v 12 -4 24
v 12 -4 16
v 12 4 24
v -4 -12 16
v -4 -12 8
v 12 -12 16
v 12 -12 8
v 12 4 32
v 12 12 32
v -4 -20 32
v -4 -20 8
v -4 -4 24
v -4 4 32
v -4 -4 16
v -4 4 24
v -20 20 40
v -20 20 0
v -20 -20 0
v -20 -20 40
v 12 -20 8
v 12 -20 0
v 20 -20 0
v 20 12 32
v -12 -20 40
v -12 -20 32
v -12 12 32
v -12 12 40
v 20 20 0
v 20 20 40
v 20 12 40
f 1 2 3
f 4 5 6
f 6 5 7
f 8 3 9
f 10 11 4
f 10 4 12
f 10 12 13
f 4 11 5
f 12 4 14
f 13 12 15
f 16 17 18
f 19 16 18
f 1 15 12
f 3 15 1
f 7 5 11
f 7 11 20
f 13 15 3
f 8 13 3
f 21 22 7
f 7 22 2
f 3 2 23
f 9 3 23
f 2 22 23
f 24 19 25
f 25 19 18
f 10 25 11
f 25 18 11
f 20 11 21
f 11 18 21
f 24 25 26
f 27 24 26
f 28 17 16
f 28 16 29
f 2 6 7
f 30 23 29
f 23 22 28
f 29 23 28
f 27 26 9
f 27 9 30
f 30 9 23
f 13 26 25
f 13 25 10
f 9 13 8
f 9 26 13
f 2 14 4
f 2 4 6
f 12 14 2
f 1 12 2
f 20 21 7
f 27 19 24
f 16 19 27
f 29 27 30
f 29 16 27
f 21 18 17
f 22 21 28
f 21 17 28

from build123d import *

# Parameters (mm, degrees)
F1_DEPTH = 32
F3_DEPTH = 25
F4_DEPTH = 40
F0_W     = 8
F0_H     = 8
F5_DEPTH = 40
F6_DEPTH = 32
F0_W_2   = 16
F7_DEPTH = 24
F8_DEPTH = 16
F9_DEPTH = 8


with BuildPart() as f1:
    # F0 (on Top) → F1 (new body)
    with BuildSketch(Plane.XY):
        Polygon((20, 12), (12, 12), (12, 4), (12, -4), (12, -12), (12, -20), (20, -20), align=None)
    extrude(amount=F1_DEPTH)

    # F2 (on face) → F3 (cut)
    with BuildSketch(Plane.YZ.offset(20)):
        Polygon((-20, 0), (12, 32), (-20, 32), align=None)
    extrude(amount=-F3_DEPTH, mode=Mode.SUBTRACT)

    # F0 (on Top) → F4 (join)
    with BuildSketch(Plane.XY):
        Polygon((12, 20), (-20, 20), (-20, -20), (-12, -20), (-12, 12), (12, 12), align=None)
    extrude(amount=F4_DEPTH)

    # F0 (on Top) → F5 (join)
    with BuildSketch(Plane.XY):
        with Locations((16, 16)):
            Rectangle(F0_W, F0_H)
    extrude(amount=F5_DEPTH)

    # F0 (on Top) → F6 (join)
    with BuildSketch(Plane.XY):
        Polygon((12, 4), (12, 12), (-12, 12), (-12, -20), (-4, -20), (-4, -12), (-4, -4), (-4, 4), align=None)
    extrude(amount=F6_DEPTH)

    # F0 (on Top) → F7 (join)
    with BuildSketch(Plane.XY):
        with Locations((4, 0)):
            Rectangle(F0_W_2, F0_H)
    extrude(amount=F7_DEPTH)

    # F0 (on Top) → F8 (join)
    with BuildSketch(Plane.XY):
        with Locations((4, -8)):
            Rectangle(F0_W_2, F0_H)
    extrude(amount=F8_DEPTH)

    # F0 (on Top) → F9 (join)
    with BuildSketch(Plane.XY):
        with Locations((4, -16)):
            Rectangle(F0_W_2, F0_H)
    extrude(amount=F9_DEPTH)


solid = f1.part
